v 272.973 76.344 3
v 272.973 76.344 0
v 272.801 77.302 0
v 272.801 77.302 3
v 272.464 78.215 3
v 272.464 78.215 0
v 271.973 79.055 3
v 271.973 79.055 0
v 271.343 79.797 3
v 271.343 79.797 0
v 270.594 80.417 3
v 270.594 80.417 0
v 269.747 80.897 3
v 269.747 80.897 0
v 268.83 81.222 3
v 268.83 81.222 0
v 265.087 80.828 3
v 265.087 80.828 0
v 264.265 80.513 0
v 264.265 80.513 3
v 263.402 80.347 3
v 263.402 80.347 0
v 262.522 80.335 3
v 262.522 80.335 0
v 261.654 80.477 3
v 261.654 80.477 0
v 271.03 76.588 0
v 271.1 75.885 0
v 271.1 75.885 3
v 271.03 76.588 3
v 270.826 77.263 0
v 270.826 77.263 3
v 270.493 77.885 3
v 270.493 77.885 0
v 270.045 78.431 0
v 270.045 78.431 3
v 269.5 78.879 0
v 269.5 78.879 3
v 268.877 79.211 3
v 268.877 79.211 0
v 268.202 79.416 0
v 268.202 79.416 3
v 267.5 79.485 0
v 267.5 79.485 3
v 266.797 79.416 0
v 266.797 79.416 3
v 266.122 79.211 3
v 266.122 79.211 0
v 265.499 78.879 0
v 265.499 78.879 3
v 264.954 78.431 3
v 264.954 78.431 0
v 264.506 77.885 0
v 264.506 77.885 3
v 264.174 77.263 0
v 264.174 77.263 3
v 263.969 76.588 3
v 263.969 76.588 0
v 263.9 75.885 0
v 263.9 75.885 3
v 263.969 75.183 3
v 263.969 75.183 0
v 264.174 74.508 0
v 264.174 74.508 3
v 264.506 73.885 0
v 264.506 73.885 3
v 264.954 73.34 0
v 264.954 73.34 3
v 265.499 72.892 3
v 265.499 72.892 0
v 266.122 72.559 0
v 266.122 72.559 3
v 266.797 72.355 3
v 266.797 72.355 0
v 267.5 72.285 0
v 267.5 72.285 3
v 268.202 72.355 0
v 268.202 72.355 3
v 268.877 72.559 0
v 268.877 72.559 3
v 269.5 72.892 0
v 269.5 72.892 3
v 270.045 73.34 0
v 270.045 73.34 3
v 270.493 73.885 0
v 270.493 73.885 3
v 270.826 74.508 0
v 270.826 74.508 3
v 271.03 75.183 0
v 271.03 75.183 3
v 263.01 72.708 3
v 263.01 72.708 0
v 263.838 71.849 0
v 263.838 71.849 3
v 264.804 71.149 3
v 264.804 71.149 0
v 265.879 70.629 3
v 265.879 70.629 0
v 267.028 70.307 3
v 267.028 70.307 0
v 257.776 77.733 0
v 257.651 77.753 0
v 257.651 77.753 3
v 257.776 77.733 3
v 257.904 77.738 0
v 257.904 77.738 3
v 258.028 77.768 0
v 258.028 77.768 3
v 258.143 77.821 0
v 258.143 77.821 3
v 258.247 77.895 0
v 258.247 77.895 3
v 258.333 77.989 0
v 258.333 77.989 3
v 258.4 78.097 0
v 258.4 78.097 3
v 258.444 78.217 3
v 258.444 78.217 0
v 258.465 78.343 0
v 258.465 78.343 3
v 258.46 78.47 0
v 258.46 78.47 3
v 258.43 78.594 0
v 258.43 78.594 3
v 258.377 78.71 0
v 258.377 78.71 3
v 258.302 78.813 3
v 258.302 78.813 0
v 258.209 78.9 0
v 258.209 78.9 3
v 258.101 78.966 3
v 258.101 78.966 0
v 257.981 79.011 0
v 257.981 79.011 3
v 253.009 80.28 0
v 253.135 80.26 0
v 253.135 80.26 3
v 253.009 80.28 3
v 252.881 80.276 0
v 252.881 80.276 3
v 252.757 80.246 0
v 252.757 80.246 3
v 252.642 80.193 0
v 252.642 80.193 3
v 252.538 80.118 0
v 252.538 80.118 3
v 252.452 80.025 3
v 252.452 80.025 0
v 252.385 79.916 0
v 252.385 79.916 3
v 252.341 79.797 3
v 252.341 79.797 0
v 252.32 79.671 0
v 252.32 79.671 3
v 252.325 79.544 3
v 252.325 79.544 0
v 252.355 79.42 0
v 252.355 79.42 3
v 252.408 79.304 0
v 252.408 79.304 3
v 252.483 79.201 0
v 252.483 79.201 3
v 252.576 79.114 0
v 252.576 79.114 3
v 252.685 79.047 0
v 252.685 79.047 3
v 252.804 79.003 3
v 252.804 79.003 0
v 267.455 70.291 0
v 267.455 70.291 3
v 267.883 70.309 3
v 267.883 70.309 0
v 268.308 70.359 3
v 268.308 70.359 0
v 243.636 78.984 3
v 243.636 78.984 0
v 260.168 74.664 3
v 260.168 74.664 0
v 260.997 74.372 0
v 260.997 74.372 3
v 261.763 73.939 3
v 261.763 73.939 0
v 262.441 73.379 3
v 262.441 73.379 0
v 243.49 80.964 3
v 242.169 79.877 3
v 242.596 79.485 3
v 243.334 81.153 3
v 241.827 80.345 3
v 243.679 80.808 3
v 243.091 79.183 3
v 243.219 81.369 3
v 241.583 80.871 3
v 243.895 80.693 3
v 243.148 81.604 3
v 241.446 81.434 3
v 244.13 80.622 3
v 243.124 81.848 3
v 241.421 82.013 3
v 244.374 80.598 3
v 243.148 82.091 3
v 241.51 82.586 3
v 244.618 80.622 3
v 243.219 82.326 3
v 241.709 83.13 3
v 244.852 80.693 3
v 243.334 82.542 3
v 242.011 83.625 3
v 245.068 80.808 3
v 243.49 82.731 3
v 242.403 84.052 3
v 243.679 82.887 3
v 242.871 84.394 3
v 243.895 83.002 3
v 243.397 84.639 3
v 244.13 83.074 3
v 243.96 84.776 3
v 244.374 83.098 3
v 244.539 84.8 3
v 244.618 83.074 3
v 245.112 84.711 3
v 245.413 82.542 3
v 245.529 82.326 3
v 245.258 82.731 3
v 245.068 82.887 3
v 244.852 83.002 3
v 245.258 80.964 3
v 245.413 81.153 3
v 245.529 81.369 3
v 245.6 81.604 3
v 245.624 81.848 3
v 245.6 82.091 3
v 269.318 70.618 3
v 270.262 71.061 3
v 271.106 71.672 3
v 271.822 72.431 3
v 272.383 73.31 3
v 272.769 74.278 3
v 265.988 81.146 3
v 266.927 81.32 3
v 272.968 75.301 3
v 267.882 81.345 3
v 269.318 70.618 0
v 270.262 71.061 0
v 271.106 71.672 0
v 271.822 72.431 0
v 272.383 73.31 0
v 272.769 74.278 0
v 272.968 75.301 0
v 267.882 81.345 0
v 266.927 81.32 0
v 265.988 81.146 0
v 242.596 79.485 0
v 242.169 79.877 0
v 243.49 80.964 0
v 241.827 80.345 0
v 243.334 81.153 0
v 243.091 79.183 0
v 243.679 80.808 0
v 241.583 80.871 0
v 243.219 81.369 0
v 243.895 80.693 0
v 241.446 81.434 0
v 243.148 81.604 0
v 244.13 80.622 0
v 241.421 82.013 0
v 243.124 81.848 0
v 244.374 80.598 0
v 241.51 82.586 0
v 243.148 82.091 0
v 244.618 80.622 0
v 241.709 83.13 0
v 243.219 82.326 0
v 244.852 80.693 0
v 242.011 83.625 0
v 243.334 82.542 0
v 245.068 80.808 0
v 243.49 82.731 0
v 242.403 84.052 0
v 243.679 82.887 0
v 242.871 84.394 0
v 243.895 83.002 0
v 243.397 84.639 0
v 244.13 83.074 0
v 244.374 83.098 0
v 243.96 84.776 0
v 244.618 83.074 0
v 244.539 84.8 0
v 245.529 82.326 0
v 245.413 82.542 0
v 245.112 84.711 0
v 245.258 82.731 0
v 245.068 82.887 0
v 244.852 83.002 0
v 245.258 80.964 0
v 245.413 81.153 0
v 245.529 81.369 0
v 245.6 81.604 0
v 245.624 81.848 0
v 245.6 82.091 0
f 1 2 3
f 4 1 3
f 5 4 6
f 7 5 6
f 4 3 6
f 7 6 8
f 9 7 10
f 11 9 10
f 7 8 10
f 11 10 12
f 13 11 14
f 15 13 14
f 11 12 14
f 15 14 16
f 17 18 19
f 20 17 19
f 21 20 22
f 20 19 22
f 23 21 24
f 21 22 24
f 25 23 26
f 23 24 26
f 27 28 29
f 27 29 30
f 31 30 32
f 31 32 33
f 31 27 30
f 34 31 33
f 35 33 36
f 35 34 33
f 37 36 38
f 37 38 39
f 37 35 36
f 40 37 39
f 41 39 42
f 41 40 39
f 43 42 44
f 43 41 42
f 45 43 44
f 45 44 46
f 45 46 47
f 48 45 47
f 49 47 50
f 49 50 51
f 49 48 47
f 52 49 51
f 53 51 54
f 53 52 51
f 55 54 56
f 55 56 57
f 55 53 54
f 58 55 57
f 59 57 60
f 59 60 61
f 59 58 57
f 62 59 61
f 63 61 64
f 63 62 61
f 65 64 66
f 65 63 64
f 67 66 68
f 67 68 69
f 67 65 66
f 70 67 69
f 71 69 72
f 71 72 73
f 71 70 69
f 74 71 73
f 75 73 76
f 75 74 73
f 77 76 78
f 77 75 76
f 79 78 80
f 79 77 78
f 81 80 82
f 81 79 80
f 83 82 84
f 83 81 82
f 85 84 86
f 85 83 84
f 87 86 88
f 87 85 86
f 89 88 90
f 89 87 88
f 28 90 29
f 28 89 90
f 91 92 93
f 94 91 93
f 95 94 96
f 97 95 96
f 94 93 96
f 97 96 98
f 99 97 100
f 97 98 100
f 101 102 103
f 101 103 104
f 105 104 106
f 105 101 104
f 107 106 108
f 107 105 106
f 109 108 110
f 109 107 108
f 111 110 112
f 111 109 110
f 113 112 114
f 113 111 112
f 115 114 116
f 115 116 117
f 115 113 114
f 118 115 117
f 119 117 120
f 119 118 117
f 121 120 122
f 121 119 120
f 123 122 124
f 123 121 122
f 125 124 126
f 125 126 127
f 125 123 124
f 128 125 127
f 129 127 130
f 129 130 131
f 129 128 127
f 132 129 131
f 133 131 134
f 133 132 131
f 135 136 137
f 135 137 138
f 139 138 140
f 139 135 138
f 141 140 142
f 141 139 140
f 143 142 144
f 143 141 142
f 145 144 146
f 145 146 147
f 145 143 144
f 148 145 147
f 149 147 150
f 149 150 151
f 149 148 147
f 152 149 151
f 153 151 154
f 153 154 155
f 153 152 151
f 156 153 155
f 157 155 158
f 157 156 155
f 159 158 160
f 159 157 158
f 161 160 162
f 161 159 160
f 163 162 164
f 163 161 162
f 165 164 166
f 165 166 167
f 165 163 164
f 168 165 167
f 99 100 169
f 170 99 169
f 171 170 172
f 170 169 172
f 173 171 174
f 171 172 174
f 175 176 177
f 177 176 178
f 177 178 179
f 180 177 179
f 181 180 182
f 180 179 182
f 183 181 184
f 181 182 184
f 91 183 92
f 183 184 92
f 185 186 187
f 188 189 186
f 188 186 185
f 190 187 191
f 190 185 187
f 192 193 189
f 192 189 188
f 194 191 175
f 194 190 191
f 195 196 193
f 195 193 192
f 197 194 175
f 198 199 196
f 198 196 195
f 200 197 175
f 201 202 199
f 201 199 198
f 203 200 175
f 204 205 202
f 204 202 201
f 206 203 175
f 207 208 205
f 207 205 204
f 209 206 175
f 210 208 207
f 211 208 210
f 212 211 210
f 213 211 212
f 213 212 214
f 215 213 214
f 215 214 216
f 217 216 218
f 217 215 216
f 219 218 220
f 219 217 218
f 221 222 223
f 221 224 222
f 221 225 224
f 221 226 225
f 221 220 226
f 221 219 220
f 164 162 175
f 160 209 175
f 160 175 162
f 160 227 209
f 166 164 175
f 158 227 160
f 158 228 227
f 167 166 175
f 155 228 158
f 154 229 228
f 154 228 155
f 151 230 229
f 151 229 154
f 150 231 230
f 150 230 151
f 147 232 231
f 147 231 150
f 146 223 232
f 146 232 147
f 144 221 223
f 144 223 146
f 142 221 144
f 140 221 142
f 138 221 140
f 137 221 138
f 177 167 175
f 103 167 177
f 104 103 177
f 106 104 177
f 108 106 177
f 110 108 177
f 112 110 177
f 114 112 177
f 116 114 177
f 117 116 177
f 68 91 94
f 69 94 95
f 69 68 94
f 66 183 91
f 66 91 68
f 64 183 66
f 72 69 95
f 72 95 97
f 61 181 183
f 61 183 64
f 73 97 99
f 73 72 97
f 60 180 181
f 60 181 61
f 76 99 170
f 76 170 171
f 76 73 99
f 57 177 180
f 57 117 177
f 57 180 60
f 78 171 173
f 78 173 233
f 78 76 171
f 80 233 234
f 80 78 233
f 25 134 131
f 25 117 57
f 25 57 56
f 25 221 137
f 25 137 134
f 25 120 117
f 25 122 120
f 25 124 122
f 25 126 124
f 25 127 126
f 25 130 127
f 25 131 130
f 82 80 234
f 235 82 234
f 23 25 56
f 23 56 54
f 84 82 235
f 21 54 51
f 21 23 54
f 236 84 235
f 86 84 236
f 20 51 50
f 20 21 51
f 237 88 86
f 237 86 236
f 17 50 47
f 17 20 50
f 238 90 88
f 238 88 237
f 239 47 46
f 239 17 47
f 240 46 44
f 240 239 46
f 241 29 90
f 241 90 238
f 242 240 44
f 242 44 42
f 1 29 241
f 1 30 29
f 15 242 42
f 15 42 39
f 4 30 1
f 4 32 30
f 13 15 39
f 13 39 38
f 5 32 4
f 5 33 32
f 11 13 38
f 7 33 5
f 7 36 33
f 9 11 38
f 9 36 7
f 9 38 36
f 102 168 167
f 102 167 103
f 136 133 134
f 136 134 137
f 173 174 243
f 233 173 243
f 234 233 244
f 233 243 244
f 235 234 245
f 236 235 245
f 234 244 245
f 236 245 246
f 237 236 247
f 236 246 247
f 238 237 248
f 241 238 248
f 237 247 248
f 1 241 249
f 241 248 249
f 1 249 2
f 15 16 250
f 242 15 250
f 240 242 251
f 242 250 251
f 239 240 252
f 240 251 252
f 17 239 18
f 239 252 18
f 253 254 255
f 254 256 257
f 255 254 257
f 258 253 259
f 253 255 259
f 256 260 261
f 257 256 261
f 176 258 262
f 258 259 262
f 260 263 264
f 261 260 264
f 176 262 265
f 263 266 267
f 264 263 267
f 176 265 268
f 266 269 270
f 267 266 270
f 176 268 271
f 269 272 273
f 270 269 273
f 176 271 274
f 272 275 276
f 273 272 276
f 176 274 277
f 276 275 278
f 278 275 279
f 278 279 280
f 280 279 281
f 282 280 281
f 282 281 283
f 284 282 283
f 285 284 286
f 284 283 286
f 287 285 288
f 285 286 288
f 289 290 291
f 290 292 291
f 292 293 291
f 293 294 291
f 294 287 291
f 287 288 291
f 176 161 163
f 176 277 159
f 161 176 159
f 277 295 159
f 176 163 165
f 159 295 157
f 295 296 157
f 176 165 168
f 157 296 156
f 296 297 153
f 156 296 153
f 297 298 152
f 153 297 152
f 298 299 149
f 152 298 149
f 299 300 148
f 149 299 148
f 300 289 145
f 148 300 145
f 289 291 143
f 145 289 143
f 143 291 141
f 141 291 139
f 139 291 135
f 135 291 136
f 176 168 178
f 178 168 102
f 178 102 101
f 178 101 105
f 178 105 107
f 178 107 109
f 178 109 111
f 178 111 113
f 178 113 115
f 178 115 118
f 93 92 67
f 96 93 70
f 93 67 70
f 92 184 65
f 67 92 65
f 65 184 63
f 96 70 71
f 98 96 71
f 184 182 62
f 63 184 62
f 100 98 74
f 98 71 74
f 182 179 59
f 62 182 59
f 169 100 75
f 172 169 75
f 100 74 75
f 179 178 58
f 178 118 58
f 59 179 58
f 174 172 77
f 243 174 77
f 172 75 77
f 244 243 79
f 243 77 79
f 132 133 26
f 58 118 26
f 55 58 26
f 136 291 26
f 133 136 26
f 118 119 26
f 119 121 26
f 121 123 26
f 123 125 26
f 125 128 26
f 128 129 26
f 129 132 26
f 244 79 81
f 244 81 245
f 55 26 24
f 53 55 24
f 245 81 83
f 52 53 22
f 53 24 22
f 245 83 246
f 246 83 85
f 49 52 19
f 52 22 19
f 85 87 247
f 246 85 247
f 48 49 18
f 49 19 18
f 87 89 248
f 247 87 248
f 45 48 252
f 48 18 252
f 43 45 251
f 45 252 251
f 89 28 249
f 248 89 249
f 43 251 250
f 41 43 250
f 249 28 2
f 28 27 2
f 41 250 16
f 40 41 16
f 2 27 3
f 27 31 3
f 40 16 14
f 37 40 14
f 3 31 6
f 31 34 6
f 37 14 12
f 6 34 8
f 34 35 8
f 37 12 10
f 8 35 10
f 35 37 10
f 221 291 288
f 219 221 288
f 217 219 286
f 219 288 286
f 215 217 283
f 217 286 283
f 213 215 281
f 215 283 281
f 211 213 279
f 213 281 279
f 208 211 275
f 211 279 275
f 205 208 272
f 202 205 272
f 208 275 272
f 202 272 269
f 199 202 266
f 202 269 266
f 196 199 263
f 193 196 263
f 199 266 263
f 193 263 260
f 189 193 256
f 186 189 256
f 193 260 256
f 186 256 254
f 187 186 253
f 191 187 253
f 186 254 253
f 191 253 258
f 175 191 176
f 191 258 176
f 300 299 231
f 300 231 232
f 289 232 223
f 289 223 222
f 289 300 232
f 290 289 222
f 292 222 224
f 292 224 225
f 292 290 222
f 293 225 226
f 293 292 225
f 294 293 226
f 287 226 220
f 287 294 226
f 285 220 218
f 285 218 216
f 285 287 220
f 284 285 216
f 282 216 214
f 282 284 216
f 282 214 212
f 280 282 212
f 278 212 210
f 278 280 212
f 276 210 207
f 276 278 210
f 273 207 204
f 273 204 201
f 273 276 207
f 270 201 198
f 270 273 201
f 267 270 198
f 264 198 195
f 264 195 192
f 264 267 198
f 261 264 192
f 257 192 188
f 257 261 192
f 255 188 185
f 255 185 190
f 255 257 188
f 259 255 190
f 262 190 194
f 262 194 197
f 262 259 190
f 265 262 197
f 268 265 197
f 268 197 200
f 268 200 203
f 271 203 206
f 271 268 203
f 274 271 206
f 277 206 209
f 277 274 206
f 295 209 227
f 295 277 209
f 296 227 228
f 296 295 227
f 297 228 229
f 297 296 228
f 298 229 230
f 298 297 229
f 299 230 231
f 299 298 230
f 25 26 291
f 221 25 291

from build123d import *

# Parameters (mm, degrees)
SKETCH_1_R      = 3.6
SKETCH_1_R_2    = 1.25
EXTRUDE_1_DEPTH = 3


with BuildPart() as part:
    # 草圖1 → 填料-伸長1 (new body)
    with BuildSketch(Plane.XY):
        with BuildLine():
            Line((243.635524691, 78.984013539), (260.167543031, 74.664105375))
            ThreePointArc((260.167543031, 74.664105375), (261.762807038, 73.939164867), (263.0099811, 72.708326596))
            ThreePointArc((263.0099811, 72.708326596), (264.804382383, 71.148673452), (267.027735224, 70.306595047))
            ThreePointArc((267.027735224, 70.306595047), (267.669348827, 70.295848059), (268.307919069, 70.359184927))
            ThreePointArc((268.307919069, 70.359184927), (271.821757968, 72.430801884), (272.972563608, 76.344151728))
            ThreePointArc((272.972563608, 76.344151728), (271.674549014, 79.439761285), (268.83007541, 81.222066065))
            ThreePointArc((268.83007541, 81.222066065), (266.927260325, 81.319865813), (265.086550743, 80.827871636))
            ThreePointArc((265.086550743, 80.827871636), (263.401602385, 80.346994525), (261.654207062, 80.477007409))
            Line((261.654207062, 80.477007409), (245.112048777, 84.71112347))
            ThreePointArc((245.112048777, 84.71112347), (241.510232103, 82.585830461), (243.635524691, 78.984013539))
        make_face()
        with Locations((267.499543018, 75.885430609)):
            Circle(SKETCH_1_R, mode=Mode.SUBTRACT)
        with Locations((244.373787095, 81.847568395)):
            Circle(SKETCH_1_R_2, mode=Mode.SUBTRACT)
        with BuildLine():
            Line((257.981059369, 79.010683825), (253.134508891, 80.260187472))
            ThreePointArc((253.134508891, 80.260187472), (252.340612803, 79.796798865), (252.80400141, 79.002902777))
            Line((252.80400141, 79.002902777), (257.650550117, 77.753399602))
            ThreePointArc((257.650550117, 77.753399602), (258.444446854, 78.216787087), (257.981059369, 79.010683825))
        make_face(mode=Mode.SUBTRACT)
    extrude(amount=EXTRUDE_1_DEPTH)


solid = part.part
